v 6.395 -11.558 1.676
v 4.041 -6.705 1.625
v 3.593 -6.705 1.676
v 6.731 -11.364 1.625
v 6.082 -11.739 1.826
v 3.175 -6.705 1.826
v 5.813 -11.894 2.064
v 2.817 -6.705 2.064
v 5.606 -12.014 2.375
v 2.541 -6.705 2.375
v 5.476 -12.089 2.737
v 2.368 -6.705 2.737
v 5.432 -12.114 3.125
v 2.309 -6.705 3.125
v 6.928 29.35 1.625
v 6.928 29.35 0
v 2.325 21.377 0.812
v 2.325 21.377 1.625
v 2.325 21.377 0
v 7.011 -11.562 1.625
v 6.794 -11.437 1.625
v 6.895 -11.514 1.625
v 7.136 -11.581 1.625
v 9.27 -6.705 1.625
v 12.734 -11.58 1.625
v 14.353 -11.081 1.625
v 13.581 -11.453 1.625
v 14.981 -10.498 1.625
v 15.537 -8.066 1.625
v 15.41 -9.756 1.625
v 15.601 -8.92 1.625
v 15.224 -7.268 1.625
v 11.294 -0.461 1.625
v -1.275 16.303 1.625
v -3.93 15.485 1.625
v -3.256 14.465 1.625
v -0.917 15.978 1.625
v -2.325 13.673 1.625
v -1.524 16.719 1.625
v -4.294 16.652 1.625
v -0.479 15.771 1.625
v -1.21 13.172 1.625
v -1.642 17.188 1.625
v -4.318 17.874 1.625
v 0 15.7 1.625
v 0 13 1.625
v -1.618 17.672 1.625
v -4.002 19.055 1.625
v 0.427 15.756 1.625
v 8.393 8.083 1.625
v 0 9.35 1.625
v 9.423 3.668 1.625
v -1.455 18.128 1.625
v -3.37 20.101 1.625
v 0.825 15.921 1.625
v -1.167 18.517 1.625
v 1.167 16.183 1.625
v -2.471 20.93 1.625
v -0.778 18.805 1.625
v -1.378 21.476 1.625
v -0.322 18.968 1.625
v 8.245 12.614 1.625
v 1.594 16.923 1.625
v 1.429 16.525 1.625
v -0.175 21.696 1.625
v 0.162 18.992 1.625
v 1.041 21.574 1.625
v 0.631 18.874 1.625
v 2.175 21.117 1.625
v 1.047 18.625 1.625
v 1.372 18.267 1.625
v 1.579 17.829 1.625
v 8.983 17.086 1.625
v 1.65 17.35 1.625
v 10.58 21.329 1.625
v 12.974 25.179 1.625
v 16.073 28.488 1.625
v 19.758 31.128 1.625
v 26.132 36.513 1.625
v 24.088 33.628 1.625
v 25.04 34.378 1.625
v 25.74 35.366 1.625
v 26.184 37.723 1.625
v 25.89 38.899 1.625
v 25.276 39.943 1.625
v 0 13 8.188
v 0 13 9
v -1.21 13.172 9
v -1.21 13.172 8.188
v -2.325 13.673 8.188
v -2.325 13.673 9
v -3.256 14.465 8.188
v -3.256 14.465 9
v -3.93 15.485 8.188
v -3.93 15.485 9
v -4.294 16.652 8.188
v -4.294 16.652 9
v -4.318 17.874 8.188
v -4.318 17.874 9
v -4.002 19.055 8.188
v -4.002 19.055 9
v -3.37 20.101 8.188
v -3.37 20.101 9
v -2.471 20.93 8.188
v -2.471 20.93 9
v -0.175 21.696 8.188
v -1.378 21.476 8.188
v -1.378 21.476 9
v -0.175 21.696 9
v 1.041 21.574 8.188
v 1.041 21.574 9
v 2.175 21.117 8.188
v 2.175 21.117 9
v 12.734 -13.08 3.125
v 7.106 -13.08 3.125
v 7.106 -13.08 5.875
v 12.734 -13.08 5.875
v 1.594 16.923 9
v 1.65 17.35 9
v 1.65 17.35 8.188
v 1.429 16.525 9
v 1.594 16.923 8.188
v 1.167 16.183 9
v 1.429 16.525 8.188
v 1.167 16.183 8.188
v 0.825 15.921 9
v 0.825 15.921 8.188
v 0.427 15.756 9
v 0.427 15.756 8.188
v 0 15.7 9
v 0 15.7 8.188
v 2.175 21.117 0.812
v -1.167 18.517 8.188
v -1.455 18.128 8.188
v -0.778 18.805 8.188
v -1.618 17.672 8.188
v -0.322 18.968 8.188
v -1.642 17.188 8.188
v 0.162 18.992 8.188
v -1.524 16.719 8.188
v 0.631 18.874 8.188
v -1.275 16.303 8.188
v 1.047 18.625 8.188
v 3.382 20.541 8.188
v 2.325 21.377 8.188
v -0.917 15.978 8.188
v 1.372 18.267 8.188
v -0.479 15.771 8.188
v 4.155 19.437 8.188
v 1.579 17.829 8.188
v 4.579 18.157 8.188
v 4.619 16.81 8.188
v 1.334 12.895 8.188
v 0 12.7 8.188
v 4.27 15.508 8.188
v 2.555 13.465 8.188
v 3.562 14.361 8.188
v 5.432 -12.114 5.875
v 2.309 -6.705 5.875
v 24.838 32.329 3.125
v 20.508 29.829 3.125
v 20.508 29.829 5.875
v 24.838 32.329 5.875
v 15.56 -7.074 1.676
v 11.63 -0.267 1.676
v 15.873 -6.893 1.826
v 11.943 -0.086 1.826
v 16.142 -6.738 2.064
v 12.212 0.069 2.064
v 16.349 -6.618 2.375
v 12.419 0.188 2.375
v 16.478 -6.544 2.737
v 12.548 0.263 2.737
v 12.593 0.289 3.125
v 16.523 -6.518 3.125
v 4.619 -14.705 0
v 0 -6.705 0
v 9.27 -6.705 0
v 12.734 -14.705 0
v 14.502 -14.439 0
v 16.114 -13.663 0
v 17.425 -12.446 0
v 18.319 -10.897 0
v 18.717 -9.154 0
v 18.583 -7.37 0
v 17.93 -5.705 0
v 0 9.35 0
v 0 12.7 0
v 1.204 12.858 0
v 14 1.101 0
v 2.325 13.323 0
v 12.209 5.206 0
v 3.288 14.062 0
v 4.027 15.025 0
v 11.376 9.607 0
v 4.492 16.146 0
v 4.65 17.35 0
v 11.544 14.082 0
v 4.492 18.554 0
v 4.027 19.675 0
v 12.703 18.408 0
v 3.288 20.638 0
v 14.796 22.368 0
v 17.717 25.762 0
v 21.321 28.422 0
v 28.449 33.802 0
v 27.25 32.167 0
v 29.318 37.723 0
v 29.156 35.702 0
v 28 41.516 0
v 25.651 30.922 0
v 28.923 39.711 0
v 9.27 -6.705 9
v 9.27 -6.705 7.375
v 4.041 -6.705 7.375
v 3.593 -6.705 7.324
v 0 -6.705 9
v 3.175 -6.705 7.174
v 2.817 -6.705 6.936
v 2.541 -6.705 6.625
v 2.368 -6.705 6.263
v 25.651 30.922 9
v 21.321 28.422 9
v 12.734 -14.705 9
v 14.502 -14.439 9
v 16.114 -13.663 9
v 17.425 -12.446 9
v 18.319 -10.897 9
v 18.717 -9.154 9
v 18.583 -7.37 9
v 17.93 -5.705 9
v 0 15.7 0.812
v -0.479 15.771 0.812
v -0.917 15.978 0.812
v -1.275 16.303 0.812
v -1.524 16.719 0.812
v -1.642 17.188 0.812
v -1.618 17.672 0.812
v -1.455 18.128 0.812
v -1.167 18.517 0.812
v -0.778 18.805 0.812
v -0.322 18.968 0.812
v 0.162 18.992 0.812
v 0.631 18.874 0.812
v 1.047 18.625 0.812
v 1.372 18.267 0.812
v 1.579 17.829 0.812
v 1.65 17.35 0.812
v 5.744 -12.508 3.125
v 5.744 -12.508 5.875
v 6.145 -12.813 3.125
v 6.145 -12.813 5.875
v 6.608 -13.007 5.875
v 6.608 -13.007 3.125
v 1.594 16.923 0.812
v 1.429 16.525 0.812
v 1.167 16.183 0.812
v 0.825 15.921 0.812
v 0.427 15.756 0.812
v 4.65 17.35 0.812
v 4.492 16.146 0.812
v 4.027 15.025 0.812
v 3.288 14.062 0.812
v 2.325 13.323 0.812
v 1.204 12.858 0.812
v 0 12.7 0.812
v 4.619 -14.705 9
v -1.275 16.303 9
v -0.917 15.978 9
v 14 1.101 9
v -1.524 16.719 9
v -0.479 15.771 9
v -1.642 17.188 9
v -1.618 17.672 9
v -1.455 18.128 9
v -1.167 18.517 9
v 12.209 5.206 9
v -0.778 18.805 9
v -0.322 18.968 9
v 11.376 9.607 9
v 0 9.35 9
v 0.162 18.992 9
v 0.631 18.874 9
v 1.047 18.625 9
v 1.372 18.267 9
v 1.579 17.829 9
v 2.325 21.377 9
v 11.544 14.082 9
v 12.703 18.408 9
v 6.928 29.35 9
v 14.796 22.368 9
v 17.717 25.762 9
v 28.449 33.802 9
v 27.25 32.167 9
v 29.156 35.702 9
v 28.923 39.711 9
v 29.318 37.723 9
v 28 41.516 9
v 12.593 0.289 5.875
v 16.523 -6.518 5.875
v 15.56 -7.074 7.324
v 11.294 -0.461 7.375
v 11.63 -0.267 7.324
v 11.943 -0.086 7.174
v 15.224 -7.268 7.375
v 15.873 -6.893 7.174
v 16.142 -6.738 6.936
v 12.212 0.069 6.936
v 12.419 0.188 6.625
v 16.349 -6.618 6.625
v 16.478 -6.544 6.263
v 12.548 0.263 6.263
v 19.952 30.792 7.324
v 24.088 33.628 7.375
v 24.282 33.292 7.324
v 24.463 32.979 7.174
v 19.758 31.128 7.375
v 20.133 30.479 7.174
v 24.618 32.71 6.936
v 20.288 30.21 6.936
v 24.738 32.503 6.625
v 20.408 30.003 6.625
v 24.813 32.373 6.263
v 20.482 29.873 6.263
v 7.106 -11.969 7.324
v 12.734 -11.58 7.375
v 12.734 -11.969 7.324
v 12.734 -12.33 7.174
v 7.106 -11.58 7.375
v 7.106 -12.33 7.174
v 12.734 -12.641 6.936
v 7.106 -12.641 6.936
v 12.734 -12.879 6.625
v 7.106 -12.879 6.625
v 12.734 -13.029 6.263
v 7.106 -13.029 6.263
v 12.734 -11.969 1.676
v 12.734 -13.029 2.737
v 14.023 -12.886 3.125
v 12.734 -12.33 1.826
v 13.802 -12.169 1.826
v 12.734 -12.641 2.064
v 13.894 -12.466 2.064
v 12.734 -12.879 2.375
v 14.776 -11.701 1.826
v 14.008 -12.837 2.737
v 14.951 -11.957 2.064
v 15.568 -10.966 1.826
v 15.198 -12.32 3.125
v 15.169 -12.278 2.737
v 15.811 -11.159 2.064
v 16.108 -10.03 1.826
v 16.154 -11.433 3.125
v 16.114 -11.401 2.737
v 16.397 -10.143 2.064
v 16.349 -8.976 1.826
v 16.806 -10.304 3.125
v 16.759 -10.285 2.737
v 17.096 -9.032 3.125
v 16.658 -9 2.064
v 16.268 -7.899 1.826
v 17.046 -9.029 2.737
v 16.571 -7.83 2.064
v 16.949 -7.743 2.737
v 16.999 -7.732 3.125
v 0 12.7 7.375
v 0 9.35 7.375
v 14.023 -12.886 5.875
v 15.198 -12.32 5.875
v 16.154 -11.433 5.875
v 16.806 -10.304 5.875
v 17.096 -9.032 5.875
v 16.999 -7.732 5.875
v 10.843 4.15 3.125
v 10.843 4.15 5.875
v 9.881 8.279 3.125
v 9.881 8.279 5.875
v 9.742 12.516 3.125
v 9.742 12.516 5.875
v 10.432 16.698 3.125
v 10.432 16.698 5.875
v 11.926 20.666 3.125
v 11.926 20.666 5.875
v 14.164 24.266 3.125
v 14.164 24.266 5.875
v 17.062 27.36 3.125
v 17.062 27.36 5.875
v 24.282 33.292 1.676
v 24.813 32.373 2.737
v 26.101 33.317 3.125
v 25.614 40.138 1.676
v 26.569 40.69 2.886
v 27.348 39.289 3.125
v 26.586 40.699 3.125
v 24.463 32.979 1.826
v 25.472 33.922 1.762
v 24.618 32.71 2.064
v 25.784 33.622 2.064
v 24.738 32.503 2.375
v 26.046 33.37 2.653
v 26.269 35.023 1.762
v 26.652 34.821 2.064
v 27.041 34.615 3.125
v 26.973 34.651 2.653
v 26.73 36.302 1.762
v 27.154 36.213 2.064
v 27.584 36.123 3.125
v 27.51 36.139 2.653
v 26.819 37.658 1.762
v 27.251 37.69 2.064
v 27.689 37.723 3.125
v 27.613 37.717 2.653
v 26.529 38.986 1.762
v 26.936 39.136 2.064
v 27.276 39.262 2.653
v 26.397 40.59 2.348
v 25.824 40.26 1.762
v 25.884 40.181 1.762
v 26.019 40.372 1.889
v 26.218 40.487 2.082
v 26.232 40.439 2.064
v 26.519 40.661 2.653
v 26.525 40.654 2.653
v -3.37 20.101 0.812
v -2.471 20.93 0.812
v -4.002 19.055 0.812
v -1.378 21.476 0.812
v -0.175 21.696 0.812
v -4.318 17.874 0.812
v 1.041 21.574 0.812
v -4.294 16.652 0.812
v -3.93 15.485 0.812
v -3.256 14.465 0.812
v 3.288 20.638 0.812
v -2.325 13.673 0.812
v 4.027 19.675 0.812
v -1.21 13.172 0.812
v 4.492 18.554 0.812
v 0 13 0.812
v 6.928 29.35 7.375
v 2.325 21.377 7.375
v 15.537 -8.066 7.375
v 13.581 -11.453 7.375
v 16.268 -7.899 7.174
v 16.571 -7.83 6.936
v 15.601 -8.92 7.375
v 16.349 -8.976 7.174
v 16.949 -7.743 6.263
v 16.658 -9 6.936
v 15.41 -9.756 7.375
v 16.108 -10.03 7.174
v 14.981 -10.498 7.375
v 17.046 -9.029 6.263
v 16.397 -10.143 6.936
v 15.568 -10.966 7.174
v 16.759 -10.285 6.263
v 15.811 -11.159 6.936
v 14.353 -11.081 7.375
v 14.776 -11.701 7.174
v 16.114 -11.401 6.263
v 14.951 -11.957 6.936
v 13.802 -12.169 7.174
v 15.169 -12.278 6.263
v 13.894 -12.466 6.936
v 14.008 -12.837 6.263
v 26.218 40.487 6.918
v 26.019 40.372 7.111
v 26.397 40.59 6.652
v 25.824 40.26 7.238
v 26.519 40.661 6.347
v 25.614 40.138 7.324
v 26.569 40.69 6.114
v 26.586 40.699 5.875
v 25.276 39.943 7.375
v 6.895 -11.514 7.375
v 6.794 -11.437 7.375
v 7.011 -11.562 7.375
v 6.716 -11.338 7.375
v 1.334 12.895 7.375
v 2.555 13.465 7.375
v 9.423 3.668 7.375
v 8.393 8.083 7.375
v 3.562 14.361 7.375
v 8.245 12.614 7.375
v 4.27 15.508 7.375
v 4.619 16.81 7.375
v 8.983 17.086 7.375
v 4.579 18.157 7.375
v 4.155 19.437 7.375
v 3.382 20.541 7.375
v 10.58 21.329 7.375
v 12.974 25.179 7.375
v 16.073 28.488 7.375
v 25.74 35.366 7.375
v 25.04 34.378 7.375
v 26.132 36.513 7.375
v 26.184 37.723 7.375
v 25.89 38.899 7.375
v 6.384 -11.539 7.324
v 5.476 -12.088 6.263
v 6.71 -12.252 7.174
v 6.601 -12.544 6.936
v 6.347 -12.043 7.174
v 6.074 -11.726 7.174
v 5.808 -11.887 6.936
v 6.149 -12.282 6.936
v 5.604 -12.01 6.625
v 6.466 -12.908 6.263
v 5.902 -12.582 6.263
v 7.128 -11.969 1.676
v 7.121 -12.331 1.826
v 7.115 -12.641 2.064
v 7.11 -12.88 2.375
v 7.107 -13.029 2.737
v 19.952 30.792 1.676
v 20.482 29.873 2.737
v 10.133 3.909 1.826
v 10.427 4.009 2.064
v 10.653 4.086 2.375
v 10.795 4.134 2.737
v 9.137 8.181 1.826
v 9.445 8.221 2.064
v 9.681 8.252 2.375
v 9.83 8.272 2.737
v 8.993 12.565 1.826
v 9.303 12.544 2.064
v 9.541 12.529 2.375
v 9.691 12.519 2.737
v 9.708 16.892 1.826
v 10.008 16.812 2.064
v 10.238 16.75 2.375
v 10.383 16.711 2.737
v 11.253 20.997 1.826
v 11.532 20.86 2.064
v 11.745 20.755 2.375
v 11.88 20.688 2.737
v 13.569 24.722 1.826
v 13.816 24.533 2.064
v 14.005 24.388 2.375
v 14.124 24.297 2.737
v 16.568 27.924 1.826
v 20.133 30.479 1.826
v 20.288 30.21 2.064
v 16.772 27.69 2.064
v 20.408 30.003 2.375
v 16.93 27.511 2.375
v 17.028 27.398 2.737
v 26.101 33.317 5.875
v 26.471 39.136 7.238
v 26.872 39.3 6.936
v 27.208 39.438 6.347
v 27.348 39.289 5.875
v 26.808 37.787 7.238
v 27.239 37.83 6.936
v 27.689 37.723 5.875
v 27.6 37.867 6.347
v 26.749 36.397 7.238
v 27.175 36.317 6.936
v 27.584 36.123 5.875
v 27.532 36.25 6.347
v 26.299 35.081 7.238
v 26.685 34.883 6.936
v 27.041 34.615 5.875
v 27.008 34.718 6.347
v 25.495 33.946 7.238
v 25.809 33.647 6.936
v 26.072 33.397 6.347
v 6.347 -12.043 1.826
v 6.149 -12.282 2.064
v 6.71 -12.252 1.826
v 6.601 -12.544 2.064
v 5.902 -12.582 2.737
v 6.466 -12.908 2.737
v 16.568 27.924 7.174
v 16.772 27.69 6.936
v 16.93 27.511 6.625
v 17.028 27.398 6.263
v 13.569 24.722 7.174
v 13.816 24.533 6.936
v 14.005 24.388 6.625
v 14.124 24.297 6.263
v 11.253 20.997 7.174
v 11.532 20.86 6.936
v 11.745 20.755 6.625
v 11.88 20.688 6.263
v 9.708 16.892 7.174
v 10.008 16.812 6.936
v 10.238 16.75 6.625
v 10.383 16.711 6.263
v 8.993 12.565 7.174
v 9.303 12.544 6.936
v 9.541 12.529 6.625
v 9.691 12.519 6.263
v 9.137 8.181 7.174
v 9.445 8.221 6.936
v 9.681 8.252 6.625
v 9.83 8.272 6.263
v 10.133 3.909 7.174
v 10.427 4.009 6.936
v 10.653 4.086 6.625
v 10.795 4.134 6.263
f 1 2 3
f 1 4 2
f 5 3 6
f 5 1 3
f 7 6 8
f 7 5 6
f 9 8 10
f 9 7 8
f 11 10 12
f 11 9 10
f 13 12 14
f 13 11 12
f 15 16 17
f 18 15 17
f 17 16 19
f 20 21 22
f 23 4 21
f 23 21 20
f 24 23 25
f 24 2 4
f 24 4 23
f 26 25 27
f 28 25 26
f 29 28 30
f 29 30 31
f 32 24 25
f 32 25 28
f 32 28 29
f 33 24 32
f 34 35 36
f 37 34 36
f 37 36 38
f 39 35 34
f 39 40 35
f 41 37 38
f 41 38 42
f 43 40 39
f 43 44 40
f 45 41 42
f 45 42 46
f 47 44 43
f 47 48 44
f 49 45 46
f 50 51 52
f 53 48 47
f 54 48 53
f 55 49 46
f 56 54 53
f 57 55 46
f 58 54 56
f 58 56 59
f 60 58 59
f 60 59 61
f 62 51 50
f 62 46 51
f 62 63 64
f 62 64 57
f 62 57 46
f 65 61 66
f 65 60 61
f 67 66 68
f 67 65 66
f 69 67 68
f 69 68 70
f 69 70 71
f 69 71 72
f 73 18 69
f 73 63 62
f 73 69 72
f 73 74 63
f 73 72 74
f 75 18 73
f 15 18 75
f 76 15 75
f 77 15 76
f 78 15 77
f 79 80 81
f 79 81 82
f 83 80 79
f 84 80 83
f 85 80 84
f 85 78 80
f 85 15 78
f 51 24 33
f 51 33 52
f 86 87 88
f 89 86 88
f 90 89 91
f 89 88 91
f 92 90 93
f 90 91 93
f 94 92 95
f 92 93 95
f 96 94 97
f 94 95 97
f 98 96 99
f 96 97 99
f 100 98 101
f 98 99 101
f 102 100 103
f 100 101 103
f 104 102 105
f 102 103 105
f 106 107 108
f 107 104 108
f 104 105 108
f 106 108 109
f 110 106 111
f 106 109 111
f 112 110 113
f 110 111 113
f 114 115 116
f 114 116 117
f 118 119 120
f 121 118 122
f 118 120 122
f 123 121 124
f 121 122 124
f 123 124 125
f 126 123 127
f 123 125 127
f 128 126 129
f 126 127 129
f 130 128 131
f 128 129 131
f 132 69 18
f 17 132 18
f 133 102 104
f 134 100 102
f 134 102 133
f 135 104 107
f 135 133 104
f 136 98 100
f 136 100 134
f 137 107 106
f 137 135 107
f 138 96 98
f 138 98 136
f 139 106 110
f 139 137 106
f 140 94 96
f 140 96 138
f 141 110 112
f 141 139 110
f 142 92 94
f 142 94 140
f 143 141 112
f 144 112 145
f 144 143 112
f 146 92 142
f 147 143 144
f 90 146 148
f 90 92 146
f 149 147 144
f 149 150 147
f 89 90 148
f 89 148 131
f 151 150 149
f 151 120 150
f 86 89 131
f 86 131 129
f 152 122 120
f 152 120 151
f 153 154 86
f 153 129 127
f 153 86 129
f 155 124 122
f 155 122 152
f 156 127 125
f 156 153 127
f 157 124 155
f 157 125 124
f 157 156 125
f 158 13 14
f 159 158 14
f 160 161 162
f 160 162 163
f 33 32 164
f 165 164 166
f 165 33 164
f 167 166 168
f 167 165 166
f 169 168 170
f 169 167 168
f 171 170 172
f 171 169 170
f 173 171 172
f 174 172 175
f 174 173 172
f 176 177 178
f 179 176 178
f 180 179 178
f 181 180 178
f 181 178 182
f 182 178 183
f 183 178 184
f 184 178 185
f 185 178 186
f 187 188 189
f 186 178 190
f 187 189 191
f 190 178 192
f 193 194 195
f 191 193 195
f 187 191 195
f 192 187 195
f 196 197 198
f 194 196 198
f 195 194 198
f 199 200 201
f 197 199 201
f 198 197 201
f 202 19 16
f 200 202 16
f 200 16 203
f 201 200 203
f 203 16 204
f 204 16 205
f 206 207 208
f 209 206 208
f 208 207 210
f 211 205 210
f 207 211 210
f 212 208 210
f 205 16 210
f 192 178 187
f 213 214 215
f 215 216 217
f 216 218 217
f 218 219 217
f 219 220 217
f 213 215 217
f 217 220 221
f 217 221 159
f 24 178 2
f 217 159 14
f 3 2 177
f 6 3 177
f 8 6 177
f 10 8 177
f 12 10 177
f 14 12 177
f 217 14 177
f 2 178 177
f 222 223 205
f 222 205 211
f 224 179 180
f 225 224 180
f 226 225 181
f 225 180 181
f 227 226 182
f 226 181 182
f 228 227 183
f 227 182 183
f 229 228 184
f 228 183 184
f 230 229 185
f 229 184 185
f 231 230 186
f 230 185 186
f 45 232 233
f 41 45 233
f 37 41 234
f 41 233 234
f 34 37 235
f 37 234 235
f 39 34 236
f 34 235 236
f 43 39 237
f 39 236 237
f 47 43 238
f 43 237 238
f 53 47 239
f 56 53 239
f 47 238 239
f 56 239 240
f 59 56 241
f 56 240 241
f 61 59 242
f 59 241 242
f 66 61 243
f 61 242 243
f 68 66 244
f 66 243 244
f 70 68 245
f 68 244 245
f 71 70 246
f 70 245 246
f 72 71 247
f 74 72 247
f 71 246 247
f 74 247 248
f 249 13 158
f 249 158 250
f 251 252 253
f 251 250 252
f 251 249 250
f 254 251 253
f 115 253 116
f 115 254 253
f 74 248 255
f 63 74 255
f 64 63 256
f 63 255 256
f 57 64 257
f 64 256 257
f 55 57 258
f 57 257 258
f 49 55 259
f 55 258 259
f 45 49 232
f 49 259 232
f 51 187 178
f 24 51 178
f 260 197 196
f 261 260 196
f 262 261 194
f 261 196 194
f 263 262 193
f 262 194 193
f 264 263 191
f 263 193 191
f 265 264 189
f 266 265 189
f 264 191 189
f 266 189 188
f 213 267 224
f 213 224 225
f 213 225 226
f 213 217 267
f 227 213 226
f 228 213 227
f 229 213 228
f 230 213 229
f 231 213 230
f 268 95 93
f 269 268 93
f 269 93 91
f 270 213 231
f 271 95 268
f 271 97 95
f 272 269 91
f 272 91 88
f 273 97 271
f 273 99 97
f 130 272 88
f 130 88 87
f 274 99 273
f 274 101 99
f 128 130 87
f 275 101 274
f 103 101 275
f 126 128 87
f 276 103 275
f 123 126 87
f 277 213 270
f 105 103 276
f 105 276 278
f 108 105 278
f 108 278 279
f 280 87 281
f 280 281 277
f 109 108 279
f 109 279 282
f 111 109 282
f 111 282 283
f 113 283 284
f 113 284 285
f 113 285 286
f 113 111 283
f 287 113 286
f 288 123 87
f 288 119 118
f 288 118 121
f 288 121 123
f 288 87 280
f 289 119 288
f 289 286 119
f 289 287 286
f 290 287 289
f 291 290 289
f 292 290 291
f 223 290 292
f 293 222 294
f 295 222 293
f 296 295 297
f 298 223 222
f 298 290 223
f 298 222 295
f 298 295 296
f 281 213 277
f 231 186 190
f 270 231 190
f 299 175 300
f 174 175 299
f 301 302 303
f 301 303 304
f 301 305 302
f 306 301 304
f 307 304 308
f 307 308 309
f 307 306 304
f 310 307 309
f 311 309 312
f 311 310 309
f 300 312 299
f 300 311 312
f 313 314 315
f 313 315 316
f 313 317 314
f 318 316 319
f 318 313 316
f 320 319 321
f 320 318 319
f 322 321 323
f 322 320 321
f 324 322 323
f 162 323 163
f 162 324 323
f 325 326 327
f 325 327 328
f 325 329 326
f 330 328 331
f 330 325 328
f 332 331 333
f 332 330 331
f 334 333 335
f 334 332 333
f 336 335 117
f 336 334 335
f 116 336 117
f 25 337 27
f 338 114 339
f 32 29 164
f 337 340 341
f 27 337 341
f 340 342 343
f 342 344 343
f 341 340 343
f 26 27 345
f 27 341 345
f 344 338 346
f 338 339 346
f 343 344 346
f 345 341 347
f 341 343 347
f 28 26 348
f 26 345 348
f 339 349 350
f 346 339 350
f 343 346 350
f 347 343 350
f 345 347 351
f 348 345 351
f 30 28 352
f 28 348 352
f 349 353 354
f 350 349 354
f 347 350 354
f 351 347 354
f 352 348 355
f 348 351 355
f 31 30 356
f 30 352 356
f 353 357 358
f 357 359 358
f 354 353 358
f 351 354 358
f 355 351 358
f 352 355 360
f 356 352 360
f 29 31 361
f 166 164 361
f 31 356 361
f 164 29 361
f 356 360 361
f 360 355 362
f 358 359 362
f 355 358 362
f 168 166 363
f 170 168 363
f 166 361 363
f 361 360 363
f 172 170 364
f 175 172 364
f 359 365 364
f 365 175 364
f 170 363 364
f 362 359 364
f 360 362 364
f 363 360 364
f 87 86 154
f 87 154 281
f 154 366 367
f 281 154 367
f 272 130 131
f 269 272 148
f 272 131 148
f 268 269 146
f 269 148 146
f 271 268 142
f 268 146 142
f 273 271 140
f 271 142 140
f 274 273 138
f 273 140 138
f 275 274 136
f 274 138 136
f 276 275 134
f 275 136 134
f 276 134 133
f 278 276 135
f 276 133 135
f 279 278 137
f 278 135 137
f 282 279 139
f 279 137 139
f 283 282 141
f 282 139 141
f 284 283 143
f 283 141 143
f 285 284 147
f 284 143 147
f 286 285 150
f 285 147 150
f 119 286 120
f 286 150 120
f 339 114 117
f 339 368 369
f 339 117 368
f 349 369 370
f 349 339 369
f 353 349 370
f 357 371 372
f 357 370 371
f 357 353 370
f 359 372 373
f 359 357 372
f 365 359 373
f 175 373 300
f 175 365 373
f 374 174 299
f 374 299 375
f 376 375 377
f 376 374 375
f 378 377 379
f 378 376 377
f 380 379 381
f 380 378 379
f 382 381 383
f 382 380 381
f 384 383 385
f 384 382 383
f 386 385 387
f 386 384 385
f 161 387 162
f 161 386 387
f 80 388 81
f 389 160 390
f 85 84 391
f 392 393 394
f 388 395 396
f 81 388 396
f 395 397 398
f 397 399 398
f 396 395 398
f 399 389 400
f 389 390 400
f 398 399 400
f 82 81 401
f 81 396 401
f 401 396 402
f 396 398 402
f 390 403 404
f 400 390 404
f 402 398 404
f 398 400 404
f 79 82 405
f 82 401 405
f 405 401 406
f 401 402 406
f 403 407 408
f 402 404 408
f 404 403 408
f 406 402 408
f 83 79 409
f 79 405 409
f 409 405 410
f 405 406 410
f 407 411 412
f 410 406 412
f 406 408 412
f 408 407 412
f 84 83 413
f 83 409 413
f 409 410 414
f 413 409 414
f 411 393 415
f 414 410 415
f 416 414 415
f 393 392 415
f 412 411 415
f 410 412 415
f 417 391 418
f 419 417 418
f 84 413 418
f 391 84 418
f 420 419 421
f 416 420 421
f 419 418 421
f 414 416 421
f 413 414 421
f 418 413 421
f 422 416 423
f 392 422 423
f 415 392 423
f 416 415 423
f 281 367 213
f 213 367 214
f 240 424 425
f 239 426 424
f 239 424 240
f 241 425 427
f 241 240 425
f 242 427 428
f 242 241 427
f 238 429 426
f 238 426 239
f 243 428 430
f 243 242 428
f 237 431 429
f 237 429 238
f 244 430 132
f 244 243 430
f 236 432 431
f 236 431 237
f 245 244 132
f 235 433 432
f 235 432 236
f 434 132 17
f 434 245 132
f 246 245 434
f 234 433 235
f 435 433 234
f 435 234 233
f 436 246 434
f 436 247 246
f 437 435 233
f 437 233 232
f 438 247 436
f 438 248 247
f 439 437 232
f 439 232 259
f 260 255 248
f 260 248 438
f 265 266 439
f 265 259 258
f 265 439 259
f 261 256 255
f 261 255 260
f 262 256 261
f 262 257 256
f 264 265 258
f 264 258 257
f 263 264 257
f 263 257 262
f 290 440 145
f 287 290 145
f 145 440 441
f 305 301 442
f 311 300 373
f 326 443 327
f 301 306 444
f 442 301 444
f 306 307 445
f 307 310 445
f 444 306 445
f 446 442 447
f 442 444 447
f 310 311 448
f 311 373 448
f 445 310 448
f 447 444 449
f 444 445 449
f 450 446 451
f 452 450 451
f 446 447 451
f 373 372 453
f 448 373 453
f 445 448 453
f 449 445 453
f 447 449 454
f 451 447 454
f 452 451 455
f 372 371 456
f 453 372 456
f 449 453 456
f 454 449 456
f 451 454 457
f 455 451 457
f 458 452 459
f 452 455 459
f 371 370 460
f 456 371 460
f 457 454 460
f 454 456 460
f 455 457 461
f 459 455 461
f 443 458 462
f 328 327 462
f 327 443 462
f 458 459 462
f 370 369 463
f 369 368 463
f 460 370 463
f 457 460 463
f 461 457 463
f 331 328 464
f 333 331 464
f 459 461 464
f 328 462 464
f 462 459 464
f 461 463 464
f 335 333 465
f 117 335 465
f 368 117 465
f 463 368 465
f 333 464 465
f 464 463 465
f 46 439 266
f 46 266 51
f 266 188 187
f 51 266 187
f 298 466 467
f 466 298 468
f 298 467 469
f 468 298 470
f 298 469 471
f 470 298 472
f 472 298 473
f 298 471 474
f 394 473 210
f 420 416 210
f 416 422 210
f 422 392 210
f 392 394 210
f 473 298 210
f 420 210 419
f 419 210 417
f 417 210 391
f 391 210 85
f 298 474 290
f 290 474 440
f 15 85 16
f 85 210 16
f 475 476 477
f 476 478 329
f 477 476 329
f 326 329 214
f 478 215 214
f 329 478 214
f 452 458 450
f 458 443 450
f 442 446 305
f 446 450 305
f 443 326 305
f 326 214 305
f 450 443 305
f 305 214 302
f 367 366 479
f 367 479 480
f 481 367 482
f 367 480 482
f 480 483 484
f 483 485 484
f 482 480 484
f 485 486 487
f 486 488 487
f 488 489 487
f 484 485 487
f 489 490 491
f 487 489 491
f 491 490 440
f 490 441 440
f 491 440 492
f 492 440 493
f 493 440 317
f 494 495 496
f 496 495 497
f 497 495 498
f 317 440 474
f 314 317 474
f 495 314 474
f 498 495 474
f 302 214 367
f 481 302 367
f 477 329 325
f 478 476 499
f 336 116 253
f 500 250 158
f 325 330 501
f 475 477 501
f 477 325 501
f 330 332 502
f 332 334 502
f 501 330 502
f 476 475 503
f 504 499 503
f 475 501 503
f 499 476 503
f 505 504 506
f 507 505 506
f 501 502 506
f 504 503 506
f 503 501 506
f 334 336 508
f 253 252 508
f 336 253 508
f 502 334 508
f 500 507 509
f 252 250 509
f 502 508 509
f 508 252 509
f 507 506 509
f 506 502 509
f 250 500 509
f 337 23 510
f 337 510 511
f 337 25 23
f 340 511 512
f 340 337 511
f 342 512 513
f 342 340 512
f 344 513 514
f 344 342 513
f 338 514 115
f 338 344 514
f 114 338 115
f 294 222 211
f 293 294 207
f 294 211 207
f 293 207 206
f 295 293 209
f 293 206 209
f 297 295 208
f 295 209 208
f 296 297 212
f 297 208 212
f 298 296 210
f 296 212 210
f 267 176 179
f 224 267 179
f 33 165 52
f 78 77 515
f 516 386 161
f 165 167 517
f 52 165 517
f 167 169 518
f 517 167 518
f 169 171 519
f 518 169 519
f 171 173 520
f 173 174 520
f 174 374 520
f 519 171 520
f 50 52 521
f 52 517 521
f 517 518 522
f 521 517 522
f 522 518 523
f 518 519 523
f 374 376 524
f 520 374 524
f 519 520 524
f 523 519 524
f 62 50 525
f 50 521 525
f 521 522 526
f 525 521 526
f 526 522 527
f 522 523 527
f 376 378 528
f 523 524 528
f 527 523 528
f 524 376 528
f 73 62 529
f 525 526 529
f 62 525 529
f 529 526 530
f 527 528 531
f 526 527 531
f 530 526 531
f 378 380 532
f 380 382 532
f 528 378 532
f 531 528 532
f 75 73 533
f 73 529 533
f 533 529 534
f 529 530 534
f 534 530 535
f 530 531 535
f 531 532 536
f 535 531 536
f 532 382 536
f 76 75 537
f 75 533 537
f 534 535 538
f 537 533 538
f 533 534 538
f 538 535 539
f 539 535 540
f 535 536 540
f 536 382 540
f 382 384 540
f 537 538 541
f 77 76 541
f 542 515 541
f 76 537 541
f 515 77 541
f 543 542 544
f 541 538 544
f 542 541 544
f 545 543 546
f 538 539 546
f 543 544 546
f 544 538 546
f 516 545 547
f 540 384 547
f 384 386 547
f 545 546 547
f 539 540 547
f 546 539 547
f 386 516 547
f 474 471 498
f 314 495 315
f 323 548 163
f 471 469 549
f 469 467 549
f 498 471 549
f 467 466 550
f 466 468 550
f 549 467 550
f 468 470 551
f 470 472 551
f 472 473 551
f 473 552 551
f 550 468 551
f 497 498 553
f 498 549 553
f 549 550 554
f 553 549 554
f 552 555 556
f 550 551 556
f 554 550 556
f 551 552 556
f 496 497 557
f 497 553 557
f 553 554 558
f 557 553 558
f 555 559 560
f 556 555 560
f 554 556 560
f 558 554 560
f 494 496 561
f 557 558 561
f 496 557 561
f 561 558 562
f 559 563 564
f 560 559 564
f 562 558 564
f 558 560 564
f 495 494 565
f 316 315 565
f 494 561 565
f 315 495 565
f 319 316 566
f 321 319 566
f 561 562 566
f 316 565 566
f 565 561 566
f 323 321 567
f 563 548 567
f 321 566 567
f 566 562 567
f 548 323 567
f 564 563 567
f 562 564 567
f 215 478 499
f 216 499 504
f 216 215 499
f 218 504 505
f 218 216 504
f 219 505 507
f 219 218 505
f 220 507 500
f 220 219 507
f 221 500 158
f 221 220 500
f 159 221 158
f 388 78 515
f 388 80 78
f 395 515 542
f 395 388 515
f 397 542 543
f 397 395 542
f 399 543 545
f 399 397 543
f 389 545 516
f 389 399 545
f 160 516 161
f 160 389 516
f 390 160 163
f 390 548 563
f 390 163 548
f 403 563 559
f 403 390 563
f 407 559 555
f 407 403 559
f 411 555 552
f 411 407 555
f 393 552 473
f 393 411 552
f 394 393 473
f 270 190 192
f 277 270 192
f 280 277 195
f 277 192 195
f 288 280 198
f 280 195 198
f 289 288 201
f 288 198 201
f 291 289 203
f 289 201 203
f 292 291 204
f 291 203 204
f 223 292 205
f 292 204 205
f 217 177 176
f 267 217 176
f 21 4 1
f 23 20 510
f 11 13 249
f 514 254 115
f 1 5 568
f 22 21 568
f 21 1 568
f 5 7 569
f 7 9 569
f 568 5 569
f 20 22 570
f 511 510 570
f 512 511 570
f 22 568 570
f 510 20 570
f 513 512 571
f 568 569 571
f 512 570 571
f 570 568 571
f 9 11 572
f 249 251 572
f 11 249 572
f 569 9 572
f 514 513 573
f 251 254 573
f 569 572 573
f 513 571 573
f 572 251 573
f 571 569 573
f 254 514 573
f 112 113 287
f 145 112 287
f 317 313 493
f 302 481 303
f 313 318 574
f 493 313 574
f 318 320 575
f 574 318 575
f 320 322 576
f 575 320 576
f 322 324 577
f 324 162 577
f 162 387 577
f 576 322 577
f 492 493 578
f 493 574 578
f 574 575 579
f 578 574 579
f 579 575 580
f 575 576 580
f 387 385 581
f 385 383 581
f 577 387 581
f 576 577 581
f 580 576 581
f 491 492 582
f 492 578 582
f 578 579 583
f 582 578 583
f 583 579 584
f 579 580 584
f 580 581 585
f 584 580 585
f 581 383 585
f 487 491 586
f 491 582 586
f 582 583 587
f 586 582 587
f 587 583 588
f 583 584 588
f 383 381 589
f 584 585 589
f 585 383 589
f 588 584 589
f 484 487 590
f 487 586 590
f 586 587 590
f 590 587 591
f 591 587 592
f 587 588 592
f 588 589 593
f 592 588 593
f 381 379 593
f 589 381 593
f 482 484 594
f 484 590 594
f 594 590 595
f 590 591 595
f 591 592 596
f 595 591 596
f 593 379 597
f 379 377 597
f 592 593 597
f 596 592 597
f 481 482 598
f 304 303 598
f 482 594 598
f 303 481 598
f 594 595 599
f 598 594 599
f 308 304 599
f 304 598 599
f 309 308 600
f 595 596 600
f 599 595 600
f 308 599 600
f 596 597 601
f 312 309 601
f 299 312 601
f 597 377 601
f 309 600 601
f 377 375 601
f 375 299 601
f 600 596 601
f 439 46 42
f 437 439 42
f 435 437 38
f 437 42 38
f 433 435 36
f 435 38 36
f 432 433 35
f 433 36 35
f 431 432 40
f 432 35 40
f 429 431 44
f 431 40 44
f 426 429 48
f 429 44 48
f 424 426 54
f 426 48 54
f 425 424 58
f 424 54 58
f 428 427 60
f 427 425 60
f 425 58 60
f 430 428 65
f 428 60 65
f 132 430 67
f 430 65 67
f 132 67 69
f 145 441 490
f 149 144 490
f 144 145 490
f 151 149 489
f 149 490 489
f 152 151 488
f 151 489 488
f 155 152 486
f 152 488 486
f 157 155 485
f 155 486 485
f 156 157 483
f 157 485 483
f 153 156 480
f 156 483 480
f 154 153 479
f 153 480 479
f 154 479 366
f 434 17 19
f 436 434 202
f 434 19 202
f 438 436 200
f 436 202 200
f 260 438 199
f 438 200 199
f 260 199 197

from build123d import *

# Parameters (mm, degrees)
F1_DEPTH    = 9
F2_T        = -1.625
F3_R        = 4.65
F4_DEPTH    = 5.75
F6_DEPTH    = 9
F7_T4_DEPTH = 11.5292765407
F8_R        = 1.5
F9_R        = 1.5
F11_DEPTH   = 25
F12_R       = 1.65
F13_DEPTH   = 0.8125
F14_R       = 4.65
F14_R_2     = 1.65
F15_DEPTH   = 0.8125
F17_DEPTH   = 25
F19_DEPTH   = 25


# Not quite as in the source:
# - a fillet or chamfer that OpenCascade refuses, or shapes differently, is made with other operations: its cross-section is extruded or revolved along the edge and cut away or added


with BuildPart() as f1:
    # F0 (on Top) → F1 (new body)
    with BuildSketch(Plane.XY):
        with BuildLine():
            Line((-2.2380131875, 10.0346875), (0, 9.35))
            Line((0, 9.35), (9.2696152423, -6.7054445662))
            Line((9.2696152423, -6.7054445662), (0, -6.7054445662))
            Line((0, -6.7054445662), (4.6188021535, -14.7054445662))
            Line((4.6188021535, -14.7054445662), (12.7337168574, -14.7054445662))
            ThreePointArc((12.7337168574, -14.7054445662), (17.9298692801, -11.7054445662), (17.9298692801, -5.7054445662))
            Line((17.9298692801, -5.7054445662), (14, 1.101288694))
            ThreePointArc((14, 1.101288694), (12.0019915499, 16.2776695961), (21.3205080757, 28.4217967697))
            Line((21.3205080757, 28.4217967697), (25.6506350946, 30.9217967697))
            ThreePointArc((25.6506350946, 30.9217967697), (29.1558482852, 35.7019755006), (28, 41.5158075373))
            Line((28, 41.5158075373), (-6.2733497352, 21.7280798417))
            ThreePointArc((-6.2733497352, 21.7280798417), (-7.2315061235, 14.8544401058), (-2.2380131875, 10.0346875))
        make_face()
        with BuildLine():
            ThreePointArc((1.65, 17.35), (1.166726189, 16.183273811), (0, 15.7))
            ThreePointArc((0, 15.7), (-1.166726189, 18.516726189), (1.65, 17.35))
        make_face(mode=Mode.SUBTRACT)
    extrude(amount=F1_DEPTH)

    # F2
    f2_openings = [f1.faces().sort_by_distance(p)[0] for p in [
        (10.863325, 31.621944, 4.5),
        (-7.231506, 14.85444, 4.5),
        (4.634808, 1.322278, 4.5),
        (4.634808, -6.705445, 4.5),
        (2.309401, -10.705445, 4.5),
        (-1.119007, 9.692344, 4.5),
    ]]
    offset(amount=F2_T, openings=f2_openings)

    # F3 (on face) → F4 (cut, through all)
    with BuildSketch(Plane.XY.offset(1.625)):
        with Locations((0, 17.35)):
            Circle(F3_R)
    extrude(amount=F4_DEPTH, mode=Mode.SUBTRACT)

    # F5 (on face) → F6 (join)
    with BuildSketch(Plane.XY):
        Polygon((0, -6.7054445662), (4.6188021535, -14.7054445662), (6.9282032303, -14.7054445662), (2.3094010768, -6.7054445662), align=None)
    extrude(amount=F6_DEPTH)

    # F7: fillet of radius 2 on 2 edges, made by hand


with BuildPart() as f7_tool2:
    # F7_s3 → F7_t4 (new body)
    with BuildSketch(Plane.XY.offset(-1.2646382703)):
        with BuildLine():
            ThreePointArc((5.4117350132, -12.0796445662), (6.1446642818, -12.8125738348), (7.1458642818, -13.0808445662))
            Line((7.1458642818, -13.0808445662), (7.1458642818, -13.2810845662))
            ThreePointArc((7.1458642818, -13.2810845662), (6.5679366623, -13.2806845662), (5.9900090428, -13.2806845662))
            Line((5.9900090428, -13.2806845662), (5.816596116, -13.1805645662))
            ThreePointArc((5.816596116, -13.1805645662), (5.5276323063, -12.6800645662), (5.2383220864, -12.1797645662))
            Line((5.2383220864, -12.1797645662), (5.4117350132, -12.0796445662))
        make_face()
    extrude(amount=F7_T4_DEPTH)

    split(bisect_by=Plane.XY.offset(9), keep=Keep.BOTTOM)

    split(bisect_by=Plane.XY, keep=Keep.TOP)


with BuildPart() as f1_1:
    add(f1.part)

    # F7_t1: union F7_tool2
    add(f7_tool2.part)

    # F8
    f8_edges = [f1_1.edges().sort_by_distance(p)[0] for p in [
        (14.557643, -3.114578, 7.375),
    ]]
    fillet(f8_edges, radius=F8_R)

    # F9
    f9_edges = [f1_1.edges().sort_by_distance(p)[0] for p in [
        (10.432362, 16.698251, 1.625),
        (3.870747, -9.409775, 1.625),
        (27.584345, 36.123263, 1.625),
        (22.673072, 31.079088, 1.625),
        (14.557643, -3.114578, 1.625),
        (16.522578, -10.892945, 1.625),
        (9.91978, -13.080445, 1.625),
        (6.144664, -12.812574, 1.625),
    ]]
    fillet(f9_edges, radius=F9_R)

    # F10 (on face) → F11 (cut)
    with BuildSketch(Plane(origin=(0, 0, 0), x_dir=(1, 0, 0), z_dir=(0, 0, -1))):
        with BuildLine():
            ThreePointArc((0, -22), (-4.65, -17.35), (0, -12.7))
            Line((0, -12.7), (0, -9.35))
            Line((0, -9.35), (-2.2380131875, -10.0346875))
            ThreePointArc((-2.2380131875, -10.0346875), (-7.2315061235, -14.8544401058), (-6.2733497352, -21.7280798417))
            Line((-6.2733497352, -21.7280798417), (0, -25.35))
            Line((0, -25.35), (0, -22))
        make_face()
    extrude(amount=-F11_DEPTH, mode=Mode.SUBTRACT)

    # F12 (on face) → F13 (cut)
    with BuildSketch(Plane(origin=(0, 0, 0), x_dir=(1, 0, 0), z_dir=(0, 0, -1))):
        with BuildLine():
            ThreePointArc((0, -22), (3.2880465325, -20.6380465325), (4.65, -17.35))
            ThreePointArc((4.65, -17.35), (3.2880465325, -14.0619534675), (0, -12.7))
            ThreePointArc((0, -12.7), (-4.65, -17.35), (0, -22))
        make_face()
        with Locations((0, -17.35)):
            Circle(F12_R, mode=Mode.SUBTRACT)
        with Locations((0, -17.35)):
            Circle(F12_R)
    extrude(amount=-F13_DEPTH, mode=Mode.SUBTRACT)

    # F14 (on face) → F15 (cut)
    with BuildSketch(Plane(origin=(0, 0, 7.375), x_dir=(1, 0, 0), z_dir=(0, 0, -1))):
        with Locations((0, -17.35)):
            Circle(F14_R)
        with Locations((0, -17.35)):
            Circle(F14_R_2, mode=Mode.SUBTRACT)
    extrude(amount=-F15_DEPTH, mode=Mode.SUBTRACT)

    # F16 (on face) → F17 (cut)
    with BuildSketch(Plane(origin=(0, 0, 0), x_dir=(1, 0, 0), z_dir=(0, 0, -1))):
        with BuildLine():
            Line((6.9282032303, -29.35), (2.325, -21.3770181276))
            ThreePointArc((2.325, -21.3770181276), (1.2035085597, -21.8415550922), (0, -22))
            Line((0, -22), (0, -25.35))
            Line((0, -25.35), (6.9282032303, -29.35))
        make_face()
    extrude(amount=-F17_DEPTH, mode=Mode.SUBTRACT)

    # F18 (on face) → F19 (cut)
    with BuildSketch(Plane.XY.offset(9)):
        with BuildLine():
            Line((2.175, 21.1172105065), (2.325, 21.3770181276))
            ThreePointArc((2.325, 21.3770181276), (-4.4915550922, 18.5535085597), (0, 12.7))
            Line((0, 12.7), (0, 13))
            ThreePointArc((0, 13), (-4.2017773444, 18.4758628462), (2.175, 21.1172105065))
        make_face()
    extrude(amount=-F19_DEPTH, mode=Mode.SUBTRACT)


solid = f1_1.part
